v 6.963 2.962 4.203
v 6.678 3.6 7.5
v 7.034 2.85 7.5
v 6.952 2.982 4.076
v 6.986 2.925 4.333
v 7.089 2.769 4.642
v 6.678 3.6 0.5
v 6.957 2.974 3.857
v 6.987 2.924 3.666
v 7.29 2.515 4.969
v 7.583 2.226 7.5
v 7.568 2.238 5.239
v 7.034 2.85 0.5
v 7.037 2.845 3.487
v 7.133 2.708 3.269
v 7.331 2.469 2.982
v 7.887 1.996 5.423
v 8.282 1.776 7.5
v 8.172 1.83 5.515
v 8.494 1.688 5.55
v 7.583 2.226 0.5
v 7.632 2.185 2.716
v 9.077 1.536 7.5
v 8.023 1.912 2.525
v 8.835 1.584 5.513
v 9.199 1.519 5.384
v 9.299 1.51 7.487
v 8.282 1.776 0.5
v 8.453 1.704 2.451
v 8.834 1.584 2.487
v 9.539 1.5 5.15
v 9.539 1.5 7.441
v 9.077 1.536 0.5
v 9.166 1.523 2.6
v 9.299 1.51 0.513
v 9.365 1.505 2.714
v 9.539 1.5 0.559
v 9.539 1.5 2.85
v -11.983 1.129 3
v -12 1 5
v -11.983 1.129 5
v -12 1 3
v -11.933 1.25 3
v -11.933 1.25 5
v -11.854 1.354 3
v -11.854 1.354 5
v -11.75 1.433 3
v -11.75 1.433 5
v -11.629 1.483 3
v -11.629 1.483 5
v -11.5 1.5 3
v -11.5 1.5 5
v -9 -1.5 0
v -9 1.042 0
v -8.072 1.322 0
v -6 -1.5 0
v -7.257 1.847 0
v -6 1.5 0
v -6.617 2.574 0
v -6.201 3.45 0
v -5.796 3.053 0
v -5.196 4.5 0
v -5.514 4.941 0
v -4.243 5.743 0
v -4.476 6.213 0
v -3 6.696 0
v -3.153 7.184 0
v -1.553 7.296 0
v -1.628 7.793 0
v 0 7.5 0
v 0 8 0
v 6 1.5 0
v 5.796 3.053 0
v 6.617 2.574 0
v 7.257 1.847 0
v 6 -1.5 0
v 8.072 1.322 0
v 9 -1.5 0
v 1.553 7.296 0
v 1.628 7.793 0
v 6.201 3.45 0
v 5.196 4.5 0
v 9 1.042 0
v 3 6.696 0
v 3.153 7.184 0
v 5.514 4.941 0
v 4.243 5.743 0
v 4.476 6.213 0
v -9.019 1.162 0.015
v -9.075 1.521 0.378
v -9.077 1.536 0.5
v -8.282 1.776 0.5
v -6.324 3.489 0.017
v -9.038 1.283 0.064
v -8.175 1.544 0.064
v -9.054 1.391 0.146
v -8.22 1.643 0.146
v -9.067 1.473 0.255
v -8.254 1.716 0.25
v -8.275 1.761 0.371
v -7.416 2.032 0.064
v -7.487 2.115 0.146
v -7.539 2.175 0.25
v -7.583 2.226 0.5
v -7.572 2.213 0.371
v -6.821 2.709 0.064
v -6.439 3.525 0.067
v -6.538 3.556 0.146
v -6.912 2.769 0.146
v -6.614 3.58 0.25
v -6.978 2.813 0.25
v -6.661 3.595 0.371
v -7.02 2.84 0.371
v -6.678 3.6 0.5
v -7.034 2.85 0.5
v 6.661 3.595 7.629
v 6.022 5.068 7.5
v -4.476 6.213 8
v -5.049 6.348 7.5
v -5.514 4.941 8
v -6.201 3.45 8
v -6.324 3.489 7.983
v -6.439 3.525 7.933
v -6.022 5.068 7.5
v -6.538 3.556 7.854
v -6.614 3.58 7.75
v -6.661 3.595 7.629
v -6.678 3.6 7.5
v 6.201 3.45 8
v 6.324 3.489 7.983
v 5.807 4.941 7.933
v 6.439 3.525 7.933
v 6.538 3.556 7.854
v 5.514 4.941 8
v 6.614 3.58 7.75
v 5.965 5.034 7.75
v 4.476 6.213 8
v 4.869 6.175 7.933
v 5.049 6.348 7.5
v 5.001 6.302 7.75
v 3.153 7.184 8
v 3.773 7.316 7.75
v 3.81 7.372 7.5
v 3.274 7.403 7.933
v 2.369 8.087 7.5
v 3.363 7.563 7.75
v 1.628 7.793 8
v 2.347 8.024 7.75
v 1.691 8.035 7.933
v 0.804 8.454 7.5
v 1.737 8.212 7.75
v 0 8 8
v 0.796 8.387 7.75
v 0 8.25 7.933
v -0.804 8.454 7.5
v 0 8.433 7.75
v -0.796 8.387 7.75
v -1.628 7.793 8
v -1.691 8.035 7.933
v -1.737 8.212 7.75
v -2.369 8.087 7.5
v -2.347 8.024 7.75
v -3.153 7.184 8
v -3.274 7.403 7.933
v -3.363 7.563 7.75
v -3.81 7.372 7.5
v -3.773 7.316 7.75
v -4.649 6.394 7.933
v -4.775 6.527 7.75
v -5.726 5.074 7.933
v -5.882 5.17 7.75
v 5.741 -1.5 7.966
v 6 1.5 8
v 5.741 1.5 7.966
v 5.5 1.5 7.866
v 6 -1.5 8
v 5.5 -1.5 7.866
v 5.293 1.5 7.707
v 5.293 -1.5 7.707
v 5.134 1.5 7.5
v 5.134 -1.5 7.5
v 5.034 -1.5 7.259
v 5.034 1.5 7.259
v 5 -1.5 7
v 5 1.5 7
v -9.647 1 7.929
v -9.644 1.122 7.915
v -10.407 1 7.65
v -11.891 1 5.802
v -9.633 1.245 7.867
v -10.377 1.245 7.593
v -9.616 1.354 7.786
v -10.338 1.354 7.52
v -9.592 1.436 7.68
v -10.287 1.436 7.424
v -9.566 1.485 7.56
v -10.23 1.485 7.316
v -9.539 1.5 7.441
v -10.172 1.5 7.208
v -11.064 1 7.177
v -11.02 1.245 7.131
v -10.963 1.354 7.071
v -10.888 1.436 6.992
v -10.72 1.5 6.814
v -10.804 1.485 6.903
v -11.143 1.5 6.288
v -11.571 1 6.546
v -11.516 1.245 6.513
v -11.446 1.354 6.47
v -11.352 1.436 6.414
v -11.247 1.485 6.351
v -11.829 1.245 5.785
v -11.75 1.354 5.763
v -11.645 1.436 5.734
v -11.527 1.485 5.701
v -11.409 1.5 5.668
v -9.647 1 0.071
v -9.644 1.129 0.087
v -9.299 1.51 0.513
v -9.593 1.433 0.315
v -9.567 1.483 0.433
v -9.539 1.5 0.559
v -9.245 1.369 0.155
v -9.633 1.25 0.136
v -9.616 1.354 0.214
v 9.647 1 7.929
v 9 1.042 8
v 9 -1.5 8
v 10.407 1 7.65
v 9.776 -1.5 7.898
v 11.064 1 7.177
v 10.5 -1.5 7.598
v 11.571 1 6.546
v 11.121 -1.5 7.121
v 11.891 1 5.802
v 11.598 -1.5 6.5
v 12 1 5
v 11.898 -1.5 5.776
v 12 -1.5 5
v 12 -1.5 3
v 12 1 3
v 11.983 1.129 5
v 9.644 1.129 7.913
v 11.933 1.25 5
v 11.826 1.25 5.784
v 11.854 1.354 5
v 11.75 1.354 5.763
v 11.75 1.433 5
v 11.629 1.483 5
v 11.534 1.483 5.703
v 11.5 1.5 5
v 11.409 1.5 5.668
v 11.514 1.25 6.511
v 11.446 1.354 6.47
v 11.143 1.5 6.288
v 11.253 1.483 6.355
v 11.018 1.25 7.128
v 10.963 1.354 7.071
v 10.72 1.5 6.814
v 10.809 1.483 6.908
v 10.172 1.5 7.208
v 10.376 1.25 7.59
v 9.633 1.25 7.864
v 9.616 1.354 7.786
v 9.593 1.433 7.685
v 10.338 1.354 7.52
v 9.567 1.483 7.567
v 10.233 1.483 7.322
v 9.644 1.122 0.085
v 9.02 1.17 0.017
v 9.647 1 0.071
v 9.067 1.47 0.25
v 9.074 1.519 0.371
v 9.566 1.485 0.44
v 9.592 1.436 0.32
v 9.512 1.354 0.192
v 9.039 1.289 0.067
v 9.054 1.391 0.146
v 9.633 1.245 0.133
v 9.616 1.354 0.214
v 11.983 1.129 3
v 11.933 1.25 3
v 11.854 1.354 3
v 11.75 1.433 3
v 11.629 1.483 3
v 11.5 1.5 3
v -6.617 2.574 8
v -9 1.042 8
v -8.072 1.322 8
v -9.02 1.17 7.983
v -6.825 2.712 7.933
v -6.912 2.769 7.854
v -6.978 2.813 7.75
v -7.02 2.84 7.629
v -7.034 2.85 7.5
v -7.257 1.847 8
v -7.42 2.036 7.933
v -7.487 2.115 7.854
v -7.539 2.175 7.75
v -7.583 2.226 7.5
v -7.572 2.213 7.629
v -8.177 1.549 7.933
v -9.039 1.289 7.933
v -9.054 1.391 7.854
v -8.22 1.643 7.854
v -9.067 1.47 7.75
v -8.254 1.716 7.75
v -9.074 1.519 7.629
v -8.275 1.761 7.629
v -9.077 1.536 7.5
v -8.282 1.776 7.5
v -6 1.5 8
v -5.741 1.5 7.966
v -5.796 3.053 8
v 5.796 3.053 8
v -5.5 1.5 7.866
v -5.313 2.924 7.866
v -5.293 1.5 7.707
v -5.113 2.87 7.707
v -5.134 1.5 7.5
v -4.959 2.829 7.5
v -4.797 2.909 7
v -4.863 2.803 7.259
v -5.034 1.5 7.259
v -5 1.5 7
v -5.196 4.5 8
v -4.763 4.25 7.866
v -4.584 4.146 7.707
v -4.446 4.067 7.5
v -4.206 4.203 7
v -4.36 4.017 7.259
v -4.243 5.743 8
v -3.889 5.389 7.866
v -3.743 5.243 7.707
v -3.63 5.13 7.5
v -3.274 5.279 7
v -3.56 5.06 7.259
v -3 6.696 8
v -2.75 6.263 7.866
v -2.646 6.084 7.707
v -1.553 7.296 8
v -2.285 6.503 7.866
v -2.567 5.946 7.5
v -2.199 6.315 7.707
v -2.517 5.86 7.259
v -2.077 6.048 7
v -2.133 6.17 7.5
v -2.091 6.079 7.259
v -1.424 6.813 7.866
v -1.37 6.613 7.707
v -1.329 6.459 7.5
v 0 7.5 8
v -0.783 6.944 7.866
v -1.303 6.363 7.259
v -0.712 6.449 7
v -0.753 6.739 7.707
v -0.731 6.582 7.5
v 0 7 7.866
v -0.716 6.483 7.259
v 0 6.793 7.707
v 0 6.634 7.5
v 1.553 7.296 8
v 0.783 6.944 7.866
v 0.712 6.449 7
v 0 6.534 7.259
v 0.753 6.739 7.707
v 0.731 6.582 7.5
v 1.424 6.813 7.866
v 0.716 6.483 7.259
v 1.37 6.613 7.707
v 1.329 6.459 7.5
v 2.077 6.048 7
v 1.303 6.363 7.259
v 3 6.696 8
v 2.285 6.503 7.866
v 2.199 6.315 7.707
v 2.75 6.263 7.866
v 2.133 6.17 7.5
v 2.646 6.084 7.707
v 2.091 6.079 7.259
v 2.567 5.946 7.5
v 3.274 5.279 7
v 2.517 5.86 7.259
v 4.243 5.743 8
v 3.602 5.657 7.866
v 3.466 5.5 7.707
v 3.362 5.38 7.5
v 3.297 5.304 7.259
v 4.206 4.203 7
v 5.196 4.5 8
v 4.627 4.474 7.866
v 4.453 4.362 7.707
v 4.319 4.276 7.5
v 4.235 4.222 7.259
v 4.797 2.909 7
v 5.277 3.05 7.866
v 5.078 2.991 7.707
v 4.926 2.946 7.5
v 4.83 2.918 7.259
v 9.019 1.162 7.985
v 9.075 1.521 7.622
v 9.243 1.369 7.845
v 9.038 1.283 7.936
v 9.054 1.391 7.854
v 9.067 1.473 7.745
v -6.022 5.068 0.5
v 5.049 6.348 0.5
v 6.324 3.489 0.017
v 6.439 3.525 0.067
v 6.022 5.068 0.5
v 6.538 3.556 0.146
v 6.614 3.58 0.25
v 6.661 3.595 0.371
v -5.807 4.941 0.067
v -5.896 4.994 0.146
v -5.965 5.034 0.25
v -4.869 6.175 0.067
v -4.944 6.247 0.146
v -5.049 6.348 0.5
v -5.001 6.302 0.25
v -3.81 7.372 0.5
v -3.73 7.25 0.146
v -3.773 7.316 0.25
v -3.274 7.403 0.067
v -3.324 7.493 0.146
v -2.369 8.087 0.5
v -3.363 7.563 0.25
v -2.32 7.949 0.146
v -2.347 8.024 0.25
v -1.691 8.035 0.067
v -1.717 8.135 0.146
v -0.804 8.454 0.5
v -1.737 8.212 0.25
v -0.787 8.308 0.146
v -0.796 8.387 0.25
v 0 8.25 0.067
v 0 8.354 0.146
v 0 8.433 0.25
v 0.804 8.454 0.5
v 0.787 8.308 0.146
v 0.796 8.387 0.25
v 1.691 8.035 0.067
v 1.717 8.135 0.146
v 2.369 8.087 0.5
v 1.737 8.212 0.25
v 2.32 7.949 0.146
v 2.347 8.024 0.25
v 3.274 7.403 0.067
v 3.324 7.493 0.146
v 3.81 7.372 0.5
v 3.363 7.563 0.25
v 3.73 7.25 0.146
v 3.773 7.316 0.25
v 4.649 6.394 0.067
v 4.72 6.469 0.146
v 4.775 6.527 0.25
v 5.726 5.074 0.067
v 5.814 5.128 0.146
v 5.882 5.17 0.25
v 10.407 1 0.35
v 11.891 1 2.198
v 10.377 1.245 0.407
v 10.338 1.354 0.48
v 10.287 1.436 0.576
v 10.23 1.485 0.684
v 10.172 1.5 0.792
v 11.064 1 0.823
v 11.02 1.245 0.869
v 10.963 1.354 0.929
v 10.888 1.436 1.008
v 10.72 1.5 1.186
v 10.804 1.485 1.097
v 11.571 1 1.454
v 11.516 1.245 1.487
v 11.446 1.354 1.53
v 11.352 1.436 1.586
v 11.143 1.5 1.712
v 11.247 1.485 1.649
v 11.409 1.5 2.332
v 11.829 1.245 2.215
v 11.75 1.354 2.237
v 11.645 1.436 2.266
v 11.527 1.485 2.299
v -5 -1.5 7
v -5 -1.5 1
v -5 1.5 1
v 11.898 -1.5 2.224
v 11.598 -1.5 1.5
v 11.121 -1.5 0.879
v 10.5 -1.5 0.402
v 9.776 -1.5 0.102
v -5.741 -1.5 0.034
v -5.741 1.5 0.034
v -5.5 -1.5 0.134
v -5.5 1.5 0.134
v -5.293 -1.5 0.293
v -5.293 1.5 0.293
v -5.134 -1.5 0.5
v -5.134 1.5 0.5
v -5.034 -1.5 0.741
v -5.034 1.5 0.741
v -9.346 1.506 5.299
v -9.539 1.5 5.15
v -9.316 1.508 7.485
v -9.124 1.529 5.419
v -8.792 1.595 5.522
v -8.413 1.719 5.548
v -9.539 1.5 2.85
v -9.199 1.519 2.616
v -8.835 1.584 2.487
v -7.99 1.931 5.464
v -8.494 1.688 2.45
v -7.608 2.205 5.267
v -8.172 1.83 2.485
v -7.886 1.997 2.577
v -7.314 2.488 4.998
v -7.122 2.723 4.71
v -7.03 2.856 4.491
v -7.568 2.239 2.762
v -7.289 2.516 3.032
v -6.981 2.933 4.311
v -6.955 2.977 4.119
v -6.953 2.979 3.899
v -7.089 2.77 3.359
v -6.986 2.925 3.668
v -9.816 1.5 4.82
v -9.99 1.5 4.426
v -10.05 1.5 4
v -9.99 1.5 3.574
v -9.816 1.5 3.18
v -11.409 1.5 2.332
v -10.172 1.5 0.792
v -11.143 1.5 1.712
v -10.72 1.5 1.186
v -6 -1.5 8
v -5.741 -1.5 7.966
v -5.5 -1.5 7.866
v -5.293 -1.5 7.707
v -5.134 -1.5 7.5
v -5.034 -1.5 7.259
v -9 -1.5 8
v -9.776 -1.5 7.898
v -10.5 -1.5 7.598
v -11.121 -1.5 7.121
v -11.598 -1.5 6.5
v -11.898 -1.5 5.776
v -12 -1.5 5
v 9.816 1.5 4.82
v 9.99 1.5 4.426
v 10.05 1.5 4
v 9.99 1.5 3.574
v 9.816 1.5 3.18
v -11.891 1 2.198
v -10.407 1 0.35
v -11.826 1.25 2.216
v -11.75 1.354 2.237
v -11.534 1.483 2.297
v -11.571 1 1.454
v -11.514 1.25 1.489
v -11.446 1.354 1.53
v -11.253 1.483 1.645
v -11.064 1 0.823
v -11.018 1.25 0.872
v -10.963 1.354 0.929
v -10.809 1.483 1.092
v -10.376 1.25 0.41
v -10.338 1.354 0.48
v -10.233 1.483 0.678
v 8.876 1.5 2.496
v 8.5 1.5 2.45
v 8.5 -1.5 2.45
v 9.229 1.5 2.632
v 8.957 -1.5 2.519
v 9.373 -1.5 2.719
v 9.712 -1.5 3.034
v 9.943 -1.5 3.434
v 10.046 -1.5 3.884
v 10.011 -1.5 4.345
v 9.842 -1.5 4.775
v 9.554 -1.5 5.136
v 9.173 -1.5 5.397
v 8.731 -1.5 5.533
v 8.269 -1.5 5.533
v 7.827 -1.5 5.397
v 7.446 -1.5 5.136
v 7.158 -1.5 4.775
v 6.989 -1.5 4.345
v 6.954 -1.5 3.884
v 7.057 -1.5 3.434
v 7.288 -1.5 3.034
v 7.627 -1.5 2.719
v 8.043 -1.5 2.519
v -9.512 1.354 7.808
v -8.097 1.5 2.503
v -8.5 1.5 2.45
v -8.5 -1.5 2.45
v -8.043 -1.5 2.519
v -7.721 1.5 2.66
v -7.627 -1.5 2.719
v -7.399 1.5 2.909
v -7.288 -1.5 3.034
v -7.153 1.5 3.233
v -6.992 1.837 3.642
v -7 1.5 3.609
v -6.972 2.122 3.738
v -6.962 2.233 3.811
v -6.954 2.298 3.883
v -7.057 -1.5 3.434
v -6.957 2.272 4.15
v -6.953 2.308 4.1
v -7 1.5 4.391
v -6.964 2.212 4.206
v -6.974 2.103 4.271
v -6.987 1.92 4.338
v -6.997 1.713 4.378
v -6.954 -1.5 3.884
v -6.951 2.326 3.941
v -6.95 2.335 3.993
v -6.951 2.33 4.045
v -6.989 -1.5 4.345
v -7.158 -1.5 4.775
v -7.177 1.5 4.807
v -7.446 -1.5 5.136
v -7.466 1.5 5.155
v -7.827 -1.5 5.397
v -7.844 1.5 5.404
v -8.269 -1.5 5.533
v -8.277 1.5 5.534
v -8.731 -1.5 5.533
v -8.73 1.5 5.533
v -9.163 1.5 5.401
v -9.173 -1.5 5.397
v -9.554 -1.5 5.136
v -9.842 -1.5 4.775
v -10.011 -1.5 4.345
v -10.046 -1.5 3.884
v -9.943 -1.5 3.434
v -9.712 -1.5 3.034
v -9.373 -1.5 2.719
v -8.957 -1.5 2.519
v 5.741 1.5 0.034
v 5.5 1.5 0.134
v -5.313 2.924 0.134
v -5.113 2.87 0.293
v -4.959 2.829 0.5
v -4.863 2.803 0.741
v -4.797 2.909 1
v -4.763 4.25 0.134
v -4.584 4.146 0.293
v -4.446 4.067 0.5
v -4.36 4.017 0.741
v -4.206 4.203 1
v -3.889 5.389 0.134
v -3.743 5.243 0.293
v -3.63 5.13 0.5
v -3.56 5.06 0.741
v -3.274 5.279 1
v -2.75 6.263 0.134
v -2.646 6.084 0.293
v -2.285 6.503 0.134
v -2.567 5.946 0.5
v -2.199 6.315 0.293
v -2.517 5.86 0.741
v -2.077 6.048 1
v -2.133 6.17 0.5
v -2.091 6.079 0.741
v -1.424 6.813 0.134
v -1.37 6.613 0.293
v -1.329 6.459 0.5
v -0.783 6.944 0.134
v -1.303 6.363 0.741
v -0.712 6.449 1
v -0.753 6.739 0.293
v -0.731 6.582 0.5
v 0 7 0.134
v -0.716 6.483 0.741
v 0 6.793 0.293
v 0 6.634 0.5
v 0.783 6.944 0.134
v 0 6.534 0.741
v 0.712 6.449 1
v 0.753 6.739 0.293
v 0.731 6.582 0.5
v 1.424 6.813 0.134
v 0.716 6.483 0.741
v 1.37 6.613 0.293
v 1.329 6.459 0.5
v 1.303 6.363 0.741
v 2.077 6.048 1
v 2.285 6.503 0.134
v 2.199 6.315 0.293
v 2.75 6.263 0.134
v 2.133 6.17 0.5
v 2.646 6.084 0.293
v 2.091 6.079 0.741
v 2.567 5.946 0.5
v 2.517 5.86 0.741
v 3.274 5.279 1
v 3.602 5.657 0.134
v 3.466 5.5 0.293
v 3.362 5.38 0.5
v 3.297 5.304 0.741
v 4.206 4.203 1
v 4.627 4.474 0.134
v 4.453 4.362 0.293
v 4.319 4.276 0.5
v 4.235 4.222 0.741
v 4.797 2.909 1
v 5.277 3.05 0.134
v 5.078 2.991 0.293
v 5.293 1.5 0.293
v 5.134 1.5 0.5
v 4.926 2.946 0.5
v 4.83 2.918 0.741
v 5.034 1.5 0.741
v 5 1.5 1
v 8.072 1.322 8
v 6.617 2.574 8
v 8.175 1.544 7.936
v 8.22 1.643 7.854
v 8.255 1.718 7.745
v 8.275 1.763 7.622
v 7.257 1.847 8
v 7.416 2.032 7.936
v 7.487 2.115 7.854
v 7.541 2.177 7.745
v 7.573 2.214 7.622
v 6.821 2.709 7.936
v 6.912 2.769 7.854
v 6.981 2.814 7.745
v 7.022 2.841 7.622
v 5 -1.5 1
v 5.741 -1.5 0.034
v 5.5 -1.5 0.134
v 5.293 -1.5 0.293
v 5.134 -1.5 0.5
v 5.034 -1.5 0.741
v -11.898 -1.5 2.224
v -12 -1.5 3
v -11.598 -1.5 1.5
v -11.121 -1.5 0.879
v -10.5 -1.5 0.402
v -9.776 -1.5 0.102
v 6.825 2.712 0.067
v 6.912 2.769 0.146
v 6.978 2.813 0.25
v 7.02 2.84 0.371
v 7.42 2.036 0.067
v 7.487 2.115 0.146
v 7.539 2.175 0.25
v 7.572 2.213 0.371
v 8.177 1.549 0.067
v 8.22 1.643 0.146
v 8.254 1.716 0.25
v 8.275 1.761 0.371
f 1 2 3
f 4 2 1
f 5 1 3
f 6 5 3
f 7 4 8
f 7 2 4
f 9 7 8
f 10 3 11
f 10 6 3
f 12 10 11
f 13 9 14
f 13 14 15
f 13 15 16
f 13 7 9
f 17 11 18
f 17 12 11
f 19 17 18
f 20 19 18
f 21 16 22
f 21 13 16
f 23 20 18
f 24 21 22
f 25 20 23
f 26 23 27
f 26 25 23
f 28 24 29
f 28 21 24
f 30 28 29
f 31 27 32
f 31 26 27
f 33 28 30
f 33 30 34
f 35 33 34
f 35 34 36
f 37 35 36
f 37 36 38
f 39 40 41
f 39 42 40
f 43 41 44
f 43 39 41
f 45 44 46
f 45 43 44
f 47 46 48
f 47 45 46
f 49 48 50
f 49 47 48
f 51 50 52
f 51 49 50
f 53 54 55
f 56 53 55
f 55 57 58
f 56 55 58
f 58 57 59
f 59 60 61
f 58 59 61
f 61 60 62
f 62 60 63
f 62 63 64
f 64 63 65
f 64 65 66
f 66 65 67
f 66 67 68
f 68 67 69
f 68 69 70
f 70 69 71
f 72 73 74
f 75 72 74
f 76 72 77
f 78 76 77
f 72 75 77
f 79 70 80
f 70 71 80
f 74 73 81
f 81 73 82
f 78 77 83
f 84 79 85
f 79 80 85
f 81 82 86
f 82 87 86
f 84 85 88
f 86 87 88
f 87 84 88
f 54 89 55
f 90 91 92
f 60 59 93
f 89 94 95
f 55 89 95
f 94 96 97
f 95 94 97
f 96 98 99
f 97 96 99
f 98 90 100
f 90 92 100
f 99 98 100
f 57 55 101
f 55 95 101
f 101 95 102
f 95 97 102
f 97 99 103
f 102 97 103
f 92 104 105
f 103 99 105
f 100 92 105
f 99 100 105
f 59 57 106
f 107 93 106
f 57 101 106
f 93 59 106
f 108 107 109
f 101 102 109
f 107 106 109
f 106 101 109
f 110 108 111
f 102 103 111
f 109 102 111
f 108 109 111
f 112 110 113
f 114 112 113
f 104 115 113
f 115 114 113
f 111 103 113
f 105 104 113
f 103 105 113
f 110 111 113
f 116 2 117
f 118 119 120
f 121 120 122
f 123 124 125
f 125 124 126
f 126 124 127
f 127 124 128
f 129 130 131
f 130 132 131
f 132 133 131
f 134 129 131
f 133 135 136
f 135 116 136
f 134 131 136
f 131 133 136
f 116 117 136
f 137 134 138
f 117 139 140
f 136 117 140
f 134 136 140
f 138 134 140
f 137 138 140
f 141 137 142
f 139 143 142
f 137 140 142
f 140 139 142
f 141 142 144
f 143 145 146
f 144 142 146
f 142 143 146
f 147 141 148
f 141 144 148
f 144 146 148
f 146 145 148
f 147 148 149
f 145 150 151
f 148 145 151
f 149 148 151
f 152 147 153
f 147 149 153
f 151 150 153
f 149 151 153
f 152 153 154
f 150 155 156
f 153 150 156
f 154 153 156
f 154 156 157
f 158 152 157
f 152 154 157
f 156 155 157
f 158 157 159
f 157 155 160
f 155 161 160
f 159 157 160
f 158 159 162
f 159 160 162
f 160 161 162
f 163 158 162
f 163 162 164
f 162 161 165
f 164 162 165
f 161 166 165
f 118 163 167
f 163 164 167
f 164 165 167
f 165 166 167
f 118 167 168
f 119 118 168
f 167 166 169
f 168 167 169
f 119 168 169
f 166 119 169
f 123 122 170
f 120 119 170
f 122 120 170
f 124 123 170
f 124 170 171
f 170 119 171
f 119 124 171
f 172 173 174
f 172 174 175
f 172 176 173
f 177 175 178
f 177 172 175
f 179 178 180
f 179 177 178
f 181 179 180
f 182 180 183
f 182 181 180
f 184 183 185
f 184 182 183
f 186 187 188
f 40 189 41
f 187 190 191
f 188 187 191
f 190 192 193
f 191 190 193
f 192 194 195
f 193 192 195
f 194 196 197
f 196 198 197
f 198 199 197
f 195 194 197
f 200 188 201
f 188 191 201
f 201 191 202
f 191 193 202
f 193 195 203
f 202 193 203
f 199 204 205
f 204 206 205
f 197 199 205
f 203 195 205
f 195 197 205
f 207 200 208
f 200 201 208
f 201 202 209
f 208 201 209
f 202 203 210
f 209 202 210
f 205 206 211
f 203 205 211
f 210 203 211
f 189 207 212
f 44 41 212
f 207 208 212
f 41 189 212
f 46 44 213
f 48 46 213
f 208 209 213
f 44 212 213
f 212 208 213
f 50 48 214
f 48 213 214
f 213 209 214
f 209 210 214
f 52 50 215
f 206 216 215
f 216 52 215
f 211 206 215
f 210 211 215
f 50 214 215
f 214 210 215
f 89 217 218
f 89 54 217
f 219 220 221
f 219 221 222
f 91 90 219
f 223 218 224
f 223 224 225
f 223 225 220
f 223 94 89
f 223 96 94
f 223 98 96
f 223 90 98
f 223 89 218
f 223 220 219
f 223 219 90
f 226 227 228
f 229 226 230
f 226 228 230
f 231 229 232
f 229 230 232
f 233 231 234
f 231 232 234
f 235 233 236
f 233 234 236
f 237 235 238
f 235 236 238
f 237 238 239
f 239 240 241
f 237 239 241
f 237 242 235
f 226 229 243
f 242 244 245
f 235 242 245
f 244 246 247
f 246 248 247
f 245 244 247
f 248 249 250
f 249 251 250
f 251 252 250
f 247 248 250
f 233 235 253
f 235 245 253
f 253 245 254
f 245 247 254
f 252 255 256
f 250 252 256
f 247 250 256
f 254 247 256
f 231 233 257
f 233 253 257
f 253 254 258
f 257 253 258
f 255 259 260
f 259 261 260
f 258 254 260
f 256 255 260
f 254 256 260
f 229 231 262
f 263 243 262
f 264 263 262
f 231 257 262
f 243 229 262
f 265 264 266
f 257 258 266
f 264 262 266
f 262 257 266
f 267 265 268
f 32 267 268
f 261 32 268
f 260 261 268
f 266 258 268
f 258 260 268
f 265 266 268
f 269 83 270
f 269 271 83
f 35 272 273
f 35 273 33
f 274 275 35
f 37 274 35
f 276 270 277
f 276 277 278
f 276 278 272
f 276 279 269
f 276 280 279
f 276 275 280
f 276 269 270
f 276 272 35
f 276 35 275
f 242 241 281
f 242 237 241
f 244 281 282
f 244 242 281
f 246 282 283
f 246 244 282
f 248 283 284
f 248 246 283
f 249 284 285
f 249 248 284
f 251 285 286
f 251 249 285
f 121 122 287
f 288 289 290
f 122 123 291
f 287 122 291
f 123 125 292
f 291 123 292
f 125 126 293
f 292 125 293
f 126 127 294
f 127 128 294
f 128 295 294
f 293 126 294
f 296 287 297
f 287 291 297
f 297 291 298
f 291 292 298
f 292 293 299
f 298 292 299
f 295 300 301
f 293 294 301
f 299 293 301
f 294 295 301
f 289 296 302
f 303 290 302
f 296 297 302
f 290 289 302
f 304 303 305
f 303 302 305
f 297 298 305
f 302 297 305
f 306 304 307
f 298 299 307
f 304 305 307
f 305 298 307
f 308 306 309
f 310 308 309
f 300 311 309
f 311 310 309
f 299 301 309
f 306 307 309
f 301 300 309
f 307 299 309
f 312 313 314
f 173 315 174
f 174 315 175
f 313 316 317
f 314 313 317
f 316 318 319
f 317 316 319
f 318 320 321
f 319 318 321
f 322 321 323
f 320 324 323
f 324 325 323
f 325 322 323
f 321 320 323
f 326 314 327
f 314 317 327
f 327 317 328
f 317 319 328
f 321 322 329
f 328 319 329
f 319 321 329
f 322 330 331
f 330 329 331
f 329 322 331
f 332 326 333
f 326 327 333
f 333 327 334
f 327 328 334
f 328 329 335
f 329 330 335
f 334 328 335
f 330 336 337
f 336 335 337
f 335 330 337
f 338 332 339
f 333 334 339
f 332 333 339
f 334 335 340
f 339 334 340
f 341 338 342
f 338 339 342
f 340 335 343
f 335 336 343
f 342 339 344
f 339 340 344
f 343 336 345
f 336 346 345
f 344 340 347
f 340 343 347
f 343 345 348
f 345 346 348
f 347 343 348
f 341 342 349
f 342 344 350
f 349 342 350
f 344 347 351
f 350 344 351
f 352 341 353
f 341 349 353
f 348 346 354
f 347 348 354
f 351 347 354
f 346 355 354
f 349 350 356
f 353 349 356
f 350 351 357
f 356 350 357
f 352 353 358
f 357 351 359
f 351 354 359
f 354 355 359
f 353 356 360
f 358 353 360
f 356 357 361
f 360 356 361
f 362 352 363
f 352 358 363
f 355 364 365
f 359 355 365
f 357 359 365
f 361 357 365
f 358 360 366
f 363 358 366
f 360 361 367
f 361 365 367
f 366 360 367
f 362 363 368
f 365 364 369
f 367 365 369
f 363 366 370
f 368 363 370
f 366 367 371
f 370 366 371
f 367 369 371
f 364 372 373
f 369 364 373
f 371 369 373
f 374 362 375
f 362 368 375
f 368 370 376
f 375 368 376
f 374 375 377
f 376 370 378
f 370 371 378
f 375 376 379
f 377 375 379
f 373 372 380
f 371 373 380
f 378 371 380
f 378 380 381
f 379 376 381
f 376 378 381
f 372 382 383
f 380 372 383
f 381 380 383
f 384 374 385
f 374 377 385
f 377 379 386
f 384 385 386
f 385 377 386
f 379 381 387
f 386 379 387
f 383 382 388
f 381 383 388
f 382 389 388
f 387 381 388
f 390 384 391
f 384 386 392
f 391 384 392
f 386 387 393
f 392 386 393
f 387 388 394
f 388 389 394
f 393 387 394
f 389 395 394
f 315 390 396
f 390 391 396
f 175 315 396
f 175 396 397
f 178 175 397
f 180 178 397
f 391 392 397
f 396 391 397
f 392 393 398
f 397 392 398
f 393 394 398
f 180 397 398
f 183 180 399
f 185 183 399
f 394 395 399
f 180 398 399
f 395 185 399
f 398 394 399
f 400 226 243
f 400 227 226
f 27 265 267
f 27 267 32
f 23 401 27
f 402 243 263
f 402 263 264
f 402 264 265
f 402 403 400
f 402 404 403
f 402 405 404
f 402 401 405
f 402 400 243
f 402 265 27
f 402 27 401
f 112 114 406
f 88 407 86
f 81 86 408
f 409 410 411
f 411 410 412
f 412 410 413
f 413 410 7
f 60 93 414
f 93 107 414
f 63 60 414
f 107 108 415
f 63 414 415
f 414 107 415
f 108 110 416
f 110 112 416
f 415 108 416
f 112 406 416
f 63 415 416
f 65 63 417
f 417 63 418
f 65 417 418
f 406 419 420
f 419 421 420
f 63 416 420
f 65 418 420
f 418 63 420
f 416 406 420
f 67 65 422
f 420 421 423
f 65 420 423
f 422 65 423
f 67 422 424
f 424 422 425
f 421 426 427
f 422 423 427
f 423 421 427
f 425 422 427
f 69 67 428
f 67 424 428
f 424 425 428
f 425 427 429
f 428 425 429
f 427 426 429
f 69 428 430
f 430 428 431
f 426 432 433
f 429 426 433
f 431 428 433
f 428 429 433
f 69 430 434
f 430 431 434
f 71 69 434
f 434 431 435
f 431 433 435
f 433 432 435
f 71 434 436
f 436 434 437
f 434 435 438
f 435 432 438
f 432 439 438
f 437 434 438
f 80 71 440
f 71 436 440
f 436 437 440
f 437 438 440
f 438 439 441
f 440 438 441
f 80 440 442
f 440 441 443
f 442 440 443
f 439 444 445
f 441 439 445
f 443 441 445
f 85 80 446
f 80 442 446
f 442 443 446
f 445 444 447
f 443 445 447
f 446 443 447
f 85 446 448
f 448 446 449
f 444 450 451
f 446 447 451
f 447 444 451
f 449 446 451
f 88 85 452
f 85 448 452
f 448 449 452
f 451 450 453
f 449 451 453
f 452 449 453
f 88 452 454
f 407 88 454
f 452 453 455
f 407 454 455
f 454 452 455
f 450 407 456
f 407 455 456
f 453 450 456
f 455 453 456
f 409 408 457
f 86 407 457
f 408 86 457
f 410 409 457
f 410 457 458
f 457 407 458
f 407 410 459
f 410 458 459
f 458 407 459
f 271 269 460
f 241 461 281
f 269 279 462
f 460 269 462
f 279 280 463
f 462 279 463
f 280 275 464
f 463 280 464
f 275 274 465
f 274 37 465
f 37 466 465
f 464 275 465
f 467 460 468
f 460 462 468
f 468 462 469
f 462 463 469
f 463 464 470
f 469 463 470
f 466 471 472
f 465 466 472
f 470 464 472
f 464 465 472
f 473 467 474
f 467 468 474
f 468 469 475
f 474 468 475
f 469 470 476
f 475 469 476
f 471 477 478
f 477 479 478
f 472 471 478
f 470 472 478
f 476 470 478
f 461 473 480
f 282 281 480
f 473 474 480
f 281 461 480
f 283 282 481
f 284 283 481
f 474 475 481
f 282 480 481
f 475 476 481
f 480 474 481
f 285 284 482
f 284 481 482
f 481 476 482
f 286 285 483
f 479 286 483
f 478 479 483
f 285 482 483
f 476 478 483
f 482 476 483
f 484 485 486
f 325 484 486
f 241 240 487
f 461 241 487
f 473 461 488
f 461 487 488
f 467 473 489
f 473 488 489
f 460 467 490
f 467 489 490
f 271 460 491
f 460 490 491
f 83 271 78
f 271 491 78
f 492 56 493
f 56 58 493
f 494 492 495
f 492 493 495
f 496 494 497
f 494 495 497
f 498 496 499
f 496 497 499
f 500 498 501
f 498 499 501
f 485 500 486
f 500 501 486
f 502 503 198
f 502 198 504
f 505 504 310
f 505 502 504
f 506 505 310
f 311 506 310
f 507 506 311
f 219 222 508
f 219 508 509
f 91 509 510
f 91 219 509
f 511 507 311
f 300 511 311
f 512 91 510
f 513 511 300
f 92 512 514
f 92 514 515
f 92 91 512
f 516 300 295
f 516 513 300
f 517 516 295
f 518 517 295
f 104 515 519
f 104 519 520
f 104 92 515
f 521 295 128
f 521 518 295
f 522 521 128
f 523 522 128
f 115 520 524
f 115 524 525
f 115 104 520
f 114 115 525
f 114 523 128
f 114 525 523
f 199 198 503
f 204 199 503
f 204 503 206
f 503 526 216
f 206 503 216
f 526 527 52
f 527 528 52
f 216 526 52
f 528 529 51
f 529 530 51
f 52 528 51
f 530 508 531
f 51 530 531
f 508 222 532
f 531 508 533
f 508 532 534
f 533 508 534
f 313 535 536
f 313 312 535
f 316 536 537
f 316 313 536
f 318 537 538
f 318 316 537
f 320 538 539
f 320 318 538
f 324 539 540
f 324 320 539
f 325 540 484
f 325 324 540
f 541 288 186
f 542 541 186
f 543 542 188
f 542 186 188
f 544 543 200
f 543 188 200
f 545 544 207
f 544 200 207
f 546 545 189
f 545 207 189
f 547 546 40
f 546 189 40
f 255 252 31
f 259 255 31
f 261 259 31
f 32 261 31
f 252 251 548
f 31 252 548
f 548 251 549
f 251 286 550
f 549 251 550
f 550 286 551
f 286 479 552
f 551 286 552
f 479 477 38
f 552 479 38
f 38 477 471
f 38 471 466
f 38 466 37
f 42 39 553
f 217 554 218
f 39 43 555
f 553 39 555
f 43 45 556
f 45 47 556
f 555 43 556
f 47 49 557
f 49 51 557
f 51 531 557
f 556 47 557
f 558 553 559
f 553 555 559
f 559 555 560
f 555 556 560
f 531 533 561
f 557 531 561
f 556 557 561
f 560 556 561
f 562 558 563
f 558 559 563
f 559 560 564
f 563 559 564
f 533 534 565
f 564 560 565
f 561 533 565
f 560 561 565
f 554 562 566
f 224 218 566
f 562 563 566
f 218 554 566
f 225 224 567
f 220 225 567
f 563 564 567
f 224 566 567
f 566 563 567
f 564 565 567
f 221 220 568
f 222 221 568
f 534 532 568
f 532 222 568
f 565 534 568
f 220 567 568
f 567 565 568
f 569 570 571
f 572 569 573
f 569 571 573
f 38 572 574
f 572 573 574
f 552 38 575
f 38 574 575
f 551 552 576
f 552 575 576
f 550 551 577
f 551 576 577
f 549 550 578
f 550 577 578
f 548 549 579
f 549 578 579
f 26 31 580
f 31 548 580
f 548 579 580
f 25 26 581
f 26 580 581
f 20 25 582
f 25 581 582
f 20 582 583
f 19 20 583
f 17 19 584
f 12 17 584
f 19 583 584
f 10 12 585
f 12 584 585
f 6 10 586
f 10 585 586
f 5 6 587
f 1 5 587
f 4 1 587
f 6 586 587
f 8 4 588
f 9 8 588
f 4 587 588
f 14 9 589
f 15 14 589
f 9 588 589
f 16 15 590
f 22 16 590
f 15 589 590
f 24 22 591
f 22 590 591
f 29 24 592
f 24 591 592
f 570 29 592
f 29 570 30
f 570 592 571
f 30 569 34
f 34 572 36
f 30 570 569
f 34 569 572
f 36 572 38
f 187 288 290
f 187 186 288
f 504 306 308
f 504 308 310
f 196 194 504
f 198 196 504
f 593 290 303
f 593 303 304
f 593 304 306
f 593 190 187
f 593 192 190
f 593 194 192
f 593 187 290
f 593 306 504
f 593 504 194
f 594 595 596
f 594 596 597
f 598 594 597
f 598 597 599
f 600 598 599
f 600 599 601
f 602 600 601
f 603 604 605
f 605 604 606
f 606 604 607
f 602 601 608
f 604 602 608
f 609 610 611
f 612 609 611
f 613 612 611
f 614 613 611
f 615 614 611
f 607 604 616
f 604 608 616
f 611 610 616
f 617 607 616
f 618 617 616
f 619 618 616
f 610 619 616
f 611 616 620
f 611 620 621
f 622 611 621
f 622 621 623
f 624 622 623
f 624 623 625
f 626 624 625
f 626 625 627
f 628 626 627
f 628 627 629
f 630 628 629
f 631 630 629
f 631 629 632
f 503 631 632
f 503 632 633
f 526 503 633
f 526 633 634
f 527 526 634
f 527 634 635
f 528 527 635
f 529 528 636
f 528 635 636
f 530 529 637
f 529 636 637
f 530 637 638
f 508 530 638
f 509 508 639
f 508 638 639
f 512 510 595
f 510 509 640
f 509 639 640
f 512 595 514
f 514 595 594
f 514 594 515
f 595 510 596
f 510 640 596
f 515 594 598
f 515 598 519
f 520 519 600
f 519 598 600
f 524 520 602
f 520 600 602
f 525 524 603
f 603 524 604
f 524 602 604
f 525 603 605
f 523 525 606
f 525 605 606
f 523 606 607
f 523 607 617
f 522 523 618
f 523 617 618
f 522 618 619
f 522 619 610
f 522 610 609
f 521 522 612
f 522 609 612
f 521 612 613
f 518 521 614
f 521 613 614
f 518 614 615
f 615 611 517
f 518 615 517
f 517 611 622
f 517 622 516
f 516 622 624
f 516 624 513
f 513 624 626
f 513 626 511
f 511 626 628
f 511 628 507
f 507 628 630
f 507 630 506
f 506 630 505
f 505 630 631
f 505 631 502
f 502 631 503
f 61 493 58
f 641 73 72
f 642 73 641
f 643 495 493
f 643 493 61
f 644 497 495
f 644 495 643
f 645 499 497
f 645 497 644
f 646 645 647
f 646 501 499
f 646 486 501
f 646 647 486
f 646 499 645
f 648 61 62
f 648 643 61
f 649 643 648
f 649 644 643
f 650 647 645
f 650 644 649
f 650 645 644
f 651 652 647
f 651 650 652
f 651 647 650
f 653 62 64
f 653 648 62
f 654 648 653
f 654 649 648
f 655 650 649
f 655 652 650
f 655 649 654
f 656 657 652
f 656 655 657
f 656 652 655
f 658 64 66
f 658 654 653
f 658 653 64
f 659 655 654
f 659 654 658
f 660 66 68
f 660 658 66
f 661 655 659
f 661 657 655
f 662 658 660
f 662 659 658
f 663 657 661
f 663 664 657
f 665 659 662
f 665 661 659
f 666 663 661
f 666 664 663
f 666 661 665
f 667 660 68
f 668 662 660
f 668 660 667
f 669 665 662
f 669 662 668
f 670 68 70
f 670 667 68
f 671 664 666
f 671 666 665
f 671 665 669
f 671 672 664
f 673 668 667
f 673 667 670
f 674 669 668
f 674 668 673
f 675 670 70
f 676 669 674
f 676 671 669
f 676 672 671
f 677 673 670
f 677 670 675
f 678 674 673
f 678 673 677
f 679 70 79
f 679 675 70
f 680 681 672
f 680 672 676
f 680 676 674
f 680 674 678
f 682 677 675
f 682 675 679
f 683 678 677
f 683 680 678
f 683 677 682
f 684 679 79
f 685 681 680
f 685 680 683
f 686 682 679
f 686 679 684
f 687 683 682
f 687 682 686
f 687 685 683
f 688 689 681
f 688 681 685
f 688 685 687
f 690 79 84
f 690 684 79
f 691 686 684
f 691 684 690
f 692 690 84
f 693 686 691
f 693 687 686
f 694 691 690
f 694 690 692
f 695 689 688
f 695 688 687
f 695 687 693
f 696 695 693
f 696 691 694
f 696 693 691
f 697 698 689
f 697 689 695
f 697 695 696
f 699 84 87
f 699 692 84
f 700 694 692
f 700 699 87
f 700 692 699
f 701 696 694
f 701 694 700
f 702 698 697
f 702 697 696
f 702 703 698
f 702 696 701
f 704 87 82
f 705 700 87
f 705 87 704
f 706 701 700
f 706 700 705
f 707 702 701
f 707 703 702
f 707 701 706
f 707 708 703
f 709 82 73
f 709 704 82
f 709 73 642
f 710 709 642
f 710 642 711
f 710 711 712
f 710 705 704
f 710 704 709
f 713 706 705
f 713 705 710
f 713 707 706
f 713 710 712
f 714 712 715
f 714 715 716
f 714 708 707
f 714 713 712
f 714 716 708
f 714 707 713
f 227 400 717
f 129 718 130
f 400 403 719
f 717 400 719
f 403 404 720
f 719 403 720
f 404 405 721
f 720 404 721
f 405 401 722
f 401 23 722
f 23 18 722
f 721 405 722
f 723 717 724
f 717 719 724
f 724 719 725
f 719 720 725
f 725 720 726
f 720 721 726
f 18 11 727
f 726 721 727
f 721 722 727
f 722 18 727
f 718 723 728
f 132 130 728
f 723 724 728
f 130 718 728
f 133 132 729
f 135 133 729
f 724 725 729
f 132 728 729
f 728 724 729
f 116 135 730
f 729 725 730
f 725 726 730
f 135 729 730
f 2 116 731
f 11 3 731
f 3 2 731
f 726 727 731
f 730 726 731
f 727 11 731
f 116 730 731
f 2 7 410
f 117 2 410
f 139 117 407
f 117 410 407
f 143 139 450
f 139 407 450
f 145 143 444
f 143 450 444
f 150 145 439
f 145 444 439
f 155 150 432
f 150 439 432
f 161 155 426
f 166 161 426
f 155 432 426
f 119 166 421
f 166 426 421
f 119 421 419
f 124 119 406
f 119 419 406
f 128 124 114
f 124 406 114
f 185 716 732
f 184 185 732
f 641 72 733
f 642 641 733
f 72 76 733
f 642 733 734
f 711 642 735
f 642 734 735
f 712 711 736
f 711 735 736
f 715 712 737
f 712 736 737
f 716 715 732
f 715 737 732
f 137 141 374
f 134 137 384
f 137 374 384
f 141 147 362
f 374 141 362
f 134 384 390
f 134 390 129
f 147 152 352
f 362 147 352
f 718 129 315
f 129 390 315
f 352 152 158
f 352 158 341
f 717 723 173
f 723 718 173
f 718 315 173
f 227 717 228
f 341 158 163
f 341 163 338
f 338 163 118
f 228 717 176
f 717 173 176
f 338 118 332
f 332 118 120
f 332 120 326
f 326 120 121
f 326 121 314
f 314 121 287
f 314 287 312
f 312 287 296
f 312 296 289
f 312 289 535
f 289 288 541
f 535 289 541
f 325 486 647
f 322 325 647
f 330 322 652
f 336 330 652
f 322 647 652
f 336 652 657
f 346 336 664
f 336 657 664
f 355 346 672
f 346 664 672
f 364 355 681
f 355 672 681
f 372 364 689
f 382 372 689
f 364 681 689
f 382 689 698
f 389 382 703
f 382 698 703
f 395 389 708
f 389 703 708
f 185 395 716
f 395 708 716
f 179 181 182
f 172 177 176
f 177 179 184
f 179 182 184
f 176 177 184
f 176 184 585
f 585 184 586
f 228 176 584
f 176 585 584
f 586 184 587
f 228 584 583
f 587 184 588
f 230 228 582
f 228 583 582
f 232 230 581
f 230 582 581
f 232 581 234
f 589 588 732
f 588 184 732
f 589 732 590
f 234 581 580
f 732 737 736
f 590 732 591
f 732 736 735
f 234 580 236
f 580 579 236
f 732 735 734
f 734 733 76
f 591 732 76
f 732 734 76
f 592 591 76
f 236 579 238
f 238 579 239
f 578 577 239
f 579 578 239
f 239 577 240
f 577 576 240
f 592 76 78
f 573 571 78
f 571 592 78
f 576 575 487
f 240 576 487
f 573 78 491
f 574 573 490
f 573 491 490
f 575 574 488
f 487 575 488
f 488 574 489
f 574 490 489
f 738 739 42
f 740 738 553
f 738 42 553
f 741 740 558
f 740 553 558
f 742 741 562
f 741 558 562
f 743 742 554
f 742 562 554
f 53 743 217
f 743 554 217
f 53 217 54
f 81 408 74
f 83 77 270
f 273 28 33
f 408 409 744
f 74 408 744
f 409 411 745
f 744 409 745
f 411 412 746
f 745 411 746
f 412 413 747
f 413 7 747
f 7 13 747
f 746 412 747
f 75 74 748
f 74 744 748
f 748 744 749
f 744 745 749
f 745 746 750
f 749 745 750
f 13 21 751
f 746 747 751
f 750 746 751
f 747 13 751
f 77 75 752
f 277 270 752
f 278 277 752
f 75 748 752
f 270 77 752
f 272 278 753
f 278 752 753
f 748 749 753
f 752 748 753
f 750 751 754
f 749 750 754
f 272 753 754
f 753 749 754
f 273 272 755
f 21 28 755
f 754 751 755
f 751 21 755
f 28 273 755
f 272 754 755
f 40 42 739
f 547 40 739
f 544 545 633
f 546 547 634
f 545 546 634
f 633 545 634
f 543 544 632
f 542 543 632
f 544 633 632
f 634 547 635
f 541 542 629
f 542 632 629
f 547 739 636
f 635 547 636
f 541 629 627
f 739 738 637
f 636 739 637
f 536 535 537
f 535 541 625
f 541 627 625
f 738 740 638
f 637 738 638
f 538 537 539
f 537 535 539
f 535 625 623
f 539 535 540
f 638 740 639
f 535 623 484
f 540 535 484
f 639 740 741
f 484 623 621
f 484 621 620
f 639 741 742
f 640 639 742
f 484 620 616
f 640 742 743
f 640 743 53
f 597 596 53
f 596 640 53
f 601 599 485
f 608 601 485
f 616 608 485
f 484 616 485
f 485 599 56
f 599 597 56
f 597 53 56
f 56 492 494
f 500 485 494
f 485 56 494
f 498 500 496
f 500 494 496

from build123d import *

# Parameters (mm, degrees)
BOSS_EXTRUDE1_DEPTH = 8
SKETCH2_R           = 1.55
CUT_EXTRUDE1_DEPTH  = 18.549928775
FILLET1_R           = 3
FILLET2_R           = 3
FILLET3_R           = 1
FILLET4_R           = 0.5


with BuildPart() as part:
    # Sketch1 → Boss-Extrude1 (new body)
    with BuildSketch(Plane.XY):
        with BuildLine():
            Line((-5, -1.5), (-5, 0))
            Line((-5, 0), (-5, 1.5))
            ThreePointArc((-5, 1.5), (0, 6.5), (5, 1.5))
            Line((5, 1.5), (5, 0))
            Line((5, 0), (5, -1.5))
            Line((5, -1.5), (12, -1.5))
            Line((12, -1.5), (12, 1.5))
            Line((12, 1.5), (7, 1.5))
            ThreePointArc((7, 1.5), (0, 8.5), (-7, 1.5))
            Line((-7, 1.5), (-12, 1.5))
            Line((-12, 1.5), (-12, -1.5))
            Line((-12, -1.5), (-5, -1.5))
        make_face()
    extrude(amount=BOSS_EXTRUDE1_DEPTH)

    # Sketch2 → Cut-Extrude1 (cut, through all)
    with BuildSketch(Plane.XZ.offset(1.5)):
        with Locations(Location((-8.5, 4, 0), (0, 0, 270))):
            Circle(SKETCH2_R)
        with Locations(Location((8.5, 4, 0), (0, 0, 270))):
            Circle(SKETCH2_R)
    extrude(amount=-CUT_EXTRUDE1_DEPTH, mode=Mode.SUBTRACT)

    # Fillet1
    # the kernel refuses this fillet: 3 mm, written as the material it adds along each edge
    with BuildSketch(Plane(origin=(-7, 1.5, -1.957967552), x_dir=(-1, 0, 0), z_dir=(0, 0, 1))) as fillet1_piece_1_section:
        with BuildLine():
            CenterArc((2.539392014, -3), FILLET1_R, 90, 72.542396876)
            ThreePointArc((-0.32242559, -2.1), (-0.081075919, -1.062303895), (0, 0))
            Line((0, 0), (2.539392014, 0))
        make_face()
    fillet1_piece_1 = extrude(amount=9.957967552, mode=Mode.PRIVATE)
    fillet1_piece_1 = split(fillet1_piece_1, bisect_by=Plane(origin=(-8.907059095, 1.548017233, 0), z_dir=(0, 0, 1)), keep=Keep.TOP, mode=Mode.PRIVATE)
    fillet1_piece_1 = fillet1_piece_1 - Plane(origin=(-8.5, 1.548017233, 4), x_dir=(0, 0, -1), z_dir=(0, -1, 0)) * Cylinder(1.55, 31, mode=Mode.PRIVATE)
    add(fillet1_piece_1)
    with BuildSketch(Plane(origin=(-7, 1.5, 0), x_dir=(-1, 0, 0), z_dir=(0, 0, 1))) as fillet1_piece_2_section:
        with BuildLine():
            CenterArc((2.539392014, -3), FILLET1_R, 90, 72.542396876)
            ThreePointArc((-0.32242559, -2.1), (-0.081075919, -1.062303895), (0, 0))
            Line((0, 0), (2.539392014, 0))
        make_face()
    fillet1_piece_2 = extrude(amount=9.957967552, mode=Mode.PRIVATE)
    fillet1_piece_2 = split(fillet1_piece_2, bisect_by=Plane(origin=(-8.907059095, 1.548017233, 8), z_dir=(0, 0, -1)), keep=Keep.TOP, mode=Mode.PRIVATE)
    fillet1_piece_2 = fillet1_piece_2 - Plane(origin=(-8.5, 1.548017233, 4), x_dir=(0, 0, -1), z_dir=(0, -1, 0)) * Cylinder(1.55, 31, mode=Mode.PRIVATE)
    add(fillet1_piece_2)
    with BuildSketch(Plane(origin=(7, 1.5, -1.957967552), x_dir=(-0.15175769928250127, 0.9884177258166114, 0), z_dir=(0, 0, 1))) as fillet1_piece_3_section:
        with BuildLine():
            CenterArc((2.579880888, -2.965253177), FILLET1_R, 98.728801562, 72.542396876)
            Line((-0.38537229, -2.50998008), (0, 0))
            ThreePointArc((0, 0), (1.062303895, -0.081075919), (2.12460779, 0))
        make_face()
    fillet1_piece_3 = extrude(amount=9.957967552, mode=Mode.PRIVATE)
    fillet1_piece_3 = split(fillet1_piece_3, bisect_by=Plane(origin=(6.913079809, 3.011198011, 0), z_dir=(0, 0, 1)), keep=Keep.TOP, mode=Mode.PRIVATE)
    fillet1_piece_3 = fillet1_piece_3 - Plane(origin=(8.5, 3.011198011, 4), x_dir=(0, 0, -1), z_dir=(0, -1, 0)) * Cylinder(1.55, 30, mode=Mode.PRIVATE)
    add(fillet1_piece_3)
    with BuildSketch(Plane(origin=(7, 1.5, 0), x_dir=(-0.15175769928250127, 0.9884177258166114, 0), z_dir=(0, 0, 1))) as fillet1_piece_4_section:
        with BuildLine():
            CenterArc((2.579880888, -2.965253177), FILLET1_R, 98.728801562, 72.542396876)
            Line((-0.38537229, -2.50998008), (0, 0))
            ThreePointArc((0, 0), (1.062303895, -0.081075919), (2.12460779, 0))
        make_face()
    fillet1_piece_4 = extrude(amount=9.957967552, mode=Mode.PRIVATE)
    fillet1_piece_4 = split(fillet1_piece_4, bisect_by=Plane(origin=(6.913079809, 3.011198011, 8), z_dir=(0, 0, -1)), keep=Keep.TOP, mode=Mode.PRIVATE)
    fillet1_piece_4 = fillet1_piece_4 - Plane(origin=(8.5, 3.011198011, 4), x_dir=(0, 0, -1), z_dir=(0, -1, 0)) * Cylinder(1.55, 30, mode=Mode.PRIVATE)
    add(fillet1_piece_4)

    # Fillet2
    # the kernel refuses this fillet: 3 mm, written as the material it takes off along each edge
    with BuildSketch(Plane(origin=(-12, 9, 0), x_dir=(1, 0, 0), z_dir=(0, -1, 0)), Plane(origin=(12, -9, 0), x_dir=(-1, 0, 0), z_dir=(0, 1, 0))) as fillet2_piece_1:
        with BuildLine():
            CenterArc((FILLET2_R, FILLET2_R), FILLET2_R, 180, 90)
            Line((0, FILLET2_R), (0, 0))
            Line((0, 0), (FILLET2_R, 0))
        make_face()
    extrude(amount=18, mode=Mode.SUBTRACT)
    with BuildSketch(Plane(origin=(-12, 9, 8), x_dir=(1, 0, 0), z_dir=(0, -1, 0)), Plane(origin=(12, -9, 8), x_dir=(-1, 0, 0), z_dir=(0, 1, 0))) as fillet2_piece_2:
        with BuildLine():
            CenterArc((FILLET2_R, -FILLET2_R), FILLET2_R, 90, 90)
            Line((0, -FILLET2_R), (0, 0))
            Line((0, 0), (FILLET2_R, 0))
        make_face()
    extrude(amount=18, mode=Mode.SUBTRACT)

    # Fillet3
    fillet3_edges = [part.edges().sort_by_distance(p)[0] for p in [
        (5, 0, 0),
        (0, 6.5, 0),
        (-5, 0, 0),
        (-5, 0, 8),
        (0, 6.5, 8),
        (5, 0, 8),
    ]]
    fillet(fillet3_edges, radius=FILLET3_R)

    # Fillet4
    fillet4_edges = [part.edges().sort_by_distance(p)[0] for p in [
        (0, 8.5, 8),
        (0, 8.5, 0),
        (-7.553486472, 2.251405066, 8),
        (7.553486472, 2.251405066, 0),
        (7.553486472, 2.251405066, 8),
        (-12, 1.5, 4),
        (-11.304145833, 1.5, 1.078825365),
        (-11.304145833, 1.5, 6.921174635),
        (-7.553486472, 2.251405066, 0),
        (-9.269696007, 1.512147249, 0.012147249),
        (-9.269696007, 1.512147249, 7.987852751),
        (12, 1.5, 4),
        (9.269696008, 1.512147249, 0.012147249),
        (9.269696008, 1.512147249, 7.987852751),
        (11.304145833, 1.5, 1.078825365),
        (11.304145833, 1.5, 6.921174635),
    ]]
    fillet(fillet4_edges, radius=FILLET4_R)


solid = part.part
